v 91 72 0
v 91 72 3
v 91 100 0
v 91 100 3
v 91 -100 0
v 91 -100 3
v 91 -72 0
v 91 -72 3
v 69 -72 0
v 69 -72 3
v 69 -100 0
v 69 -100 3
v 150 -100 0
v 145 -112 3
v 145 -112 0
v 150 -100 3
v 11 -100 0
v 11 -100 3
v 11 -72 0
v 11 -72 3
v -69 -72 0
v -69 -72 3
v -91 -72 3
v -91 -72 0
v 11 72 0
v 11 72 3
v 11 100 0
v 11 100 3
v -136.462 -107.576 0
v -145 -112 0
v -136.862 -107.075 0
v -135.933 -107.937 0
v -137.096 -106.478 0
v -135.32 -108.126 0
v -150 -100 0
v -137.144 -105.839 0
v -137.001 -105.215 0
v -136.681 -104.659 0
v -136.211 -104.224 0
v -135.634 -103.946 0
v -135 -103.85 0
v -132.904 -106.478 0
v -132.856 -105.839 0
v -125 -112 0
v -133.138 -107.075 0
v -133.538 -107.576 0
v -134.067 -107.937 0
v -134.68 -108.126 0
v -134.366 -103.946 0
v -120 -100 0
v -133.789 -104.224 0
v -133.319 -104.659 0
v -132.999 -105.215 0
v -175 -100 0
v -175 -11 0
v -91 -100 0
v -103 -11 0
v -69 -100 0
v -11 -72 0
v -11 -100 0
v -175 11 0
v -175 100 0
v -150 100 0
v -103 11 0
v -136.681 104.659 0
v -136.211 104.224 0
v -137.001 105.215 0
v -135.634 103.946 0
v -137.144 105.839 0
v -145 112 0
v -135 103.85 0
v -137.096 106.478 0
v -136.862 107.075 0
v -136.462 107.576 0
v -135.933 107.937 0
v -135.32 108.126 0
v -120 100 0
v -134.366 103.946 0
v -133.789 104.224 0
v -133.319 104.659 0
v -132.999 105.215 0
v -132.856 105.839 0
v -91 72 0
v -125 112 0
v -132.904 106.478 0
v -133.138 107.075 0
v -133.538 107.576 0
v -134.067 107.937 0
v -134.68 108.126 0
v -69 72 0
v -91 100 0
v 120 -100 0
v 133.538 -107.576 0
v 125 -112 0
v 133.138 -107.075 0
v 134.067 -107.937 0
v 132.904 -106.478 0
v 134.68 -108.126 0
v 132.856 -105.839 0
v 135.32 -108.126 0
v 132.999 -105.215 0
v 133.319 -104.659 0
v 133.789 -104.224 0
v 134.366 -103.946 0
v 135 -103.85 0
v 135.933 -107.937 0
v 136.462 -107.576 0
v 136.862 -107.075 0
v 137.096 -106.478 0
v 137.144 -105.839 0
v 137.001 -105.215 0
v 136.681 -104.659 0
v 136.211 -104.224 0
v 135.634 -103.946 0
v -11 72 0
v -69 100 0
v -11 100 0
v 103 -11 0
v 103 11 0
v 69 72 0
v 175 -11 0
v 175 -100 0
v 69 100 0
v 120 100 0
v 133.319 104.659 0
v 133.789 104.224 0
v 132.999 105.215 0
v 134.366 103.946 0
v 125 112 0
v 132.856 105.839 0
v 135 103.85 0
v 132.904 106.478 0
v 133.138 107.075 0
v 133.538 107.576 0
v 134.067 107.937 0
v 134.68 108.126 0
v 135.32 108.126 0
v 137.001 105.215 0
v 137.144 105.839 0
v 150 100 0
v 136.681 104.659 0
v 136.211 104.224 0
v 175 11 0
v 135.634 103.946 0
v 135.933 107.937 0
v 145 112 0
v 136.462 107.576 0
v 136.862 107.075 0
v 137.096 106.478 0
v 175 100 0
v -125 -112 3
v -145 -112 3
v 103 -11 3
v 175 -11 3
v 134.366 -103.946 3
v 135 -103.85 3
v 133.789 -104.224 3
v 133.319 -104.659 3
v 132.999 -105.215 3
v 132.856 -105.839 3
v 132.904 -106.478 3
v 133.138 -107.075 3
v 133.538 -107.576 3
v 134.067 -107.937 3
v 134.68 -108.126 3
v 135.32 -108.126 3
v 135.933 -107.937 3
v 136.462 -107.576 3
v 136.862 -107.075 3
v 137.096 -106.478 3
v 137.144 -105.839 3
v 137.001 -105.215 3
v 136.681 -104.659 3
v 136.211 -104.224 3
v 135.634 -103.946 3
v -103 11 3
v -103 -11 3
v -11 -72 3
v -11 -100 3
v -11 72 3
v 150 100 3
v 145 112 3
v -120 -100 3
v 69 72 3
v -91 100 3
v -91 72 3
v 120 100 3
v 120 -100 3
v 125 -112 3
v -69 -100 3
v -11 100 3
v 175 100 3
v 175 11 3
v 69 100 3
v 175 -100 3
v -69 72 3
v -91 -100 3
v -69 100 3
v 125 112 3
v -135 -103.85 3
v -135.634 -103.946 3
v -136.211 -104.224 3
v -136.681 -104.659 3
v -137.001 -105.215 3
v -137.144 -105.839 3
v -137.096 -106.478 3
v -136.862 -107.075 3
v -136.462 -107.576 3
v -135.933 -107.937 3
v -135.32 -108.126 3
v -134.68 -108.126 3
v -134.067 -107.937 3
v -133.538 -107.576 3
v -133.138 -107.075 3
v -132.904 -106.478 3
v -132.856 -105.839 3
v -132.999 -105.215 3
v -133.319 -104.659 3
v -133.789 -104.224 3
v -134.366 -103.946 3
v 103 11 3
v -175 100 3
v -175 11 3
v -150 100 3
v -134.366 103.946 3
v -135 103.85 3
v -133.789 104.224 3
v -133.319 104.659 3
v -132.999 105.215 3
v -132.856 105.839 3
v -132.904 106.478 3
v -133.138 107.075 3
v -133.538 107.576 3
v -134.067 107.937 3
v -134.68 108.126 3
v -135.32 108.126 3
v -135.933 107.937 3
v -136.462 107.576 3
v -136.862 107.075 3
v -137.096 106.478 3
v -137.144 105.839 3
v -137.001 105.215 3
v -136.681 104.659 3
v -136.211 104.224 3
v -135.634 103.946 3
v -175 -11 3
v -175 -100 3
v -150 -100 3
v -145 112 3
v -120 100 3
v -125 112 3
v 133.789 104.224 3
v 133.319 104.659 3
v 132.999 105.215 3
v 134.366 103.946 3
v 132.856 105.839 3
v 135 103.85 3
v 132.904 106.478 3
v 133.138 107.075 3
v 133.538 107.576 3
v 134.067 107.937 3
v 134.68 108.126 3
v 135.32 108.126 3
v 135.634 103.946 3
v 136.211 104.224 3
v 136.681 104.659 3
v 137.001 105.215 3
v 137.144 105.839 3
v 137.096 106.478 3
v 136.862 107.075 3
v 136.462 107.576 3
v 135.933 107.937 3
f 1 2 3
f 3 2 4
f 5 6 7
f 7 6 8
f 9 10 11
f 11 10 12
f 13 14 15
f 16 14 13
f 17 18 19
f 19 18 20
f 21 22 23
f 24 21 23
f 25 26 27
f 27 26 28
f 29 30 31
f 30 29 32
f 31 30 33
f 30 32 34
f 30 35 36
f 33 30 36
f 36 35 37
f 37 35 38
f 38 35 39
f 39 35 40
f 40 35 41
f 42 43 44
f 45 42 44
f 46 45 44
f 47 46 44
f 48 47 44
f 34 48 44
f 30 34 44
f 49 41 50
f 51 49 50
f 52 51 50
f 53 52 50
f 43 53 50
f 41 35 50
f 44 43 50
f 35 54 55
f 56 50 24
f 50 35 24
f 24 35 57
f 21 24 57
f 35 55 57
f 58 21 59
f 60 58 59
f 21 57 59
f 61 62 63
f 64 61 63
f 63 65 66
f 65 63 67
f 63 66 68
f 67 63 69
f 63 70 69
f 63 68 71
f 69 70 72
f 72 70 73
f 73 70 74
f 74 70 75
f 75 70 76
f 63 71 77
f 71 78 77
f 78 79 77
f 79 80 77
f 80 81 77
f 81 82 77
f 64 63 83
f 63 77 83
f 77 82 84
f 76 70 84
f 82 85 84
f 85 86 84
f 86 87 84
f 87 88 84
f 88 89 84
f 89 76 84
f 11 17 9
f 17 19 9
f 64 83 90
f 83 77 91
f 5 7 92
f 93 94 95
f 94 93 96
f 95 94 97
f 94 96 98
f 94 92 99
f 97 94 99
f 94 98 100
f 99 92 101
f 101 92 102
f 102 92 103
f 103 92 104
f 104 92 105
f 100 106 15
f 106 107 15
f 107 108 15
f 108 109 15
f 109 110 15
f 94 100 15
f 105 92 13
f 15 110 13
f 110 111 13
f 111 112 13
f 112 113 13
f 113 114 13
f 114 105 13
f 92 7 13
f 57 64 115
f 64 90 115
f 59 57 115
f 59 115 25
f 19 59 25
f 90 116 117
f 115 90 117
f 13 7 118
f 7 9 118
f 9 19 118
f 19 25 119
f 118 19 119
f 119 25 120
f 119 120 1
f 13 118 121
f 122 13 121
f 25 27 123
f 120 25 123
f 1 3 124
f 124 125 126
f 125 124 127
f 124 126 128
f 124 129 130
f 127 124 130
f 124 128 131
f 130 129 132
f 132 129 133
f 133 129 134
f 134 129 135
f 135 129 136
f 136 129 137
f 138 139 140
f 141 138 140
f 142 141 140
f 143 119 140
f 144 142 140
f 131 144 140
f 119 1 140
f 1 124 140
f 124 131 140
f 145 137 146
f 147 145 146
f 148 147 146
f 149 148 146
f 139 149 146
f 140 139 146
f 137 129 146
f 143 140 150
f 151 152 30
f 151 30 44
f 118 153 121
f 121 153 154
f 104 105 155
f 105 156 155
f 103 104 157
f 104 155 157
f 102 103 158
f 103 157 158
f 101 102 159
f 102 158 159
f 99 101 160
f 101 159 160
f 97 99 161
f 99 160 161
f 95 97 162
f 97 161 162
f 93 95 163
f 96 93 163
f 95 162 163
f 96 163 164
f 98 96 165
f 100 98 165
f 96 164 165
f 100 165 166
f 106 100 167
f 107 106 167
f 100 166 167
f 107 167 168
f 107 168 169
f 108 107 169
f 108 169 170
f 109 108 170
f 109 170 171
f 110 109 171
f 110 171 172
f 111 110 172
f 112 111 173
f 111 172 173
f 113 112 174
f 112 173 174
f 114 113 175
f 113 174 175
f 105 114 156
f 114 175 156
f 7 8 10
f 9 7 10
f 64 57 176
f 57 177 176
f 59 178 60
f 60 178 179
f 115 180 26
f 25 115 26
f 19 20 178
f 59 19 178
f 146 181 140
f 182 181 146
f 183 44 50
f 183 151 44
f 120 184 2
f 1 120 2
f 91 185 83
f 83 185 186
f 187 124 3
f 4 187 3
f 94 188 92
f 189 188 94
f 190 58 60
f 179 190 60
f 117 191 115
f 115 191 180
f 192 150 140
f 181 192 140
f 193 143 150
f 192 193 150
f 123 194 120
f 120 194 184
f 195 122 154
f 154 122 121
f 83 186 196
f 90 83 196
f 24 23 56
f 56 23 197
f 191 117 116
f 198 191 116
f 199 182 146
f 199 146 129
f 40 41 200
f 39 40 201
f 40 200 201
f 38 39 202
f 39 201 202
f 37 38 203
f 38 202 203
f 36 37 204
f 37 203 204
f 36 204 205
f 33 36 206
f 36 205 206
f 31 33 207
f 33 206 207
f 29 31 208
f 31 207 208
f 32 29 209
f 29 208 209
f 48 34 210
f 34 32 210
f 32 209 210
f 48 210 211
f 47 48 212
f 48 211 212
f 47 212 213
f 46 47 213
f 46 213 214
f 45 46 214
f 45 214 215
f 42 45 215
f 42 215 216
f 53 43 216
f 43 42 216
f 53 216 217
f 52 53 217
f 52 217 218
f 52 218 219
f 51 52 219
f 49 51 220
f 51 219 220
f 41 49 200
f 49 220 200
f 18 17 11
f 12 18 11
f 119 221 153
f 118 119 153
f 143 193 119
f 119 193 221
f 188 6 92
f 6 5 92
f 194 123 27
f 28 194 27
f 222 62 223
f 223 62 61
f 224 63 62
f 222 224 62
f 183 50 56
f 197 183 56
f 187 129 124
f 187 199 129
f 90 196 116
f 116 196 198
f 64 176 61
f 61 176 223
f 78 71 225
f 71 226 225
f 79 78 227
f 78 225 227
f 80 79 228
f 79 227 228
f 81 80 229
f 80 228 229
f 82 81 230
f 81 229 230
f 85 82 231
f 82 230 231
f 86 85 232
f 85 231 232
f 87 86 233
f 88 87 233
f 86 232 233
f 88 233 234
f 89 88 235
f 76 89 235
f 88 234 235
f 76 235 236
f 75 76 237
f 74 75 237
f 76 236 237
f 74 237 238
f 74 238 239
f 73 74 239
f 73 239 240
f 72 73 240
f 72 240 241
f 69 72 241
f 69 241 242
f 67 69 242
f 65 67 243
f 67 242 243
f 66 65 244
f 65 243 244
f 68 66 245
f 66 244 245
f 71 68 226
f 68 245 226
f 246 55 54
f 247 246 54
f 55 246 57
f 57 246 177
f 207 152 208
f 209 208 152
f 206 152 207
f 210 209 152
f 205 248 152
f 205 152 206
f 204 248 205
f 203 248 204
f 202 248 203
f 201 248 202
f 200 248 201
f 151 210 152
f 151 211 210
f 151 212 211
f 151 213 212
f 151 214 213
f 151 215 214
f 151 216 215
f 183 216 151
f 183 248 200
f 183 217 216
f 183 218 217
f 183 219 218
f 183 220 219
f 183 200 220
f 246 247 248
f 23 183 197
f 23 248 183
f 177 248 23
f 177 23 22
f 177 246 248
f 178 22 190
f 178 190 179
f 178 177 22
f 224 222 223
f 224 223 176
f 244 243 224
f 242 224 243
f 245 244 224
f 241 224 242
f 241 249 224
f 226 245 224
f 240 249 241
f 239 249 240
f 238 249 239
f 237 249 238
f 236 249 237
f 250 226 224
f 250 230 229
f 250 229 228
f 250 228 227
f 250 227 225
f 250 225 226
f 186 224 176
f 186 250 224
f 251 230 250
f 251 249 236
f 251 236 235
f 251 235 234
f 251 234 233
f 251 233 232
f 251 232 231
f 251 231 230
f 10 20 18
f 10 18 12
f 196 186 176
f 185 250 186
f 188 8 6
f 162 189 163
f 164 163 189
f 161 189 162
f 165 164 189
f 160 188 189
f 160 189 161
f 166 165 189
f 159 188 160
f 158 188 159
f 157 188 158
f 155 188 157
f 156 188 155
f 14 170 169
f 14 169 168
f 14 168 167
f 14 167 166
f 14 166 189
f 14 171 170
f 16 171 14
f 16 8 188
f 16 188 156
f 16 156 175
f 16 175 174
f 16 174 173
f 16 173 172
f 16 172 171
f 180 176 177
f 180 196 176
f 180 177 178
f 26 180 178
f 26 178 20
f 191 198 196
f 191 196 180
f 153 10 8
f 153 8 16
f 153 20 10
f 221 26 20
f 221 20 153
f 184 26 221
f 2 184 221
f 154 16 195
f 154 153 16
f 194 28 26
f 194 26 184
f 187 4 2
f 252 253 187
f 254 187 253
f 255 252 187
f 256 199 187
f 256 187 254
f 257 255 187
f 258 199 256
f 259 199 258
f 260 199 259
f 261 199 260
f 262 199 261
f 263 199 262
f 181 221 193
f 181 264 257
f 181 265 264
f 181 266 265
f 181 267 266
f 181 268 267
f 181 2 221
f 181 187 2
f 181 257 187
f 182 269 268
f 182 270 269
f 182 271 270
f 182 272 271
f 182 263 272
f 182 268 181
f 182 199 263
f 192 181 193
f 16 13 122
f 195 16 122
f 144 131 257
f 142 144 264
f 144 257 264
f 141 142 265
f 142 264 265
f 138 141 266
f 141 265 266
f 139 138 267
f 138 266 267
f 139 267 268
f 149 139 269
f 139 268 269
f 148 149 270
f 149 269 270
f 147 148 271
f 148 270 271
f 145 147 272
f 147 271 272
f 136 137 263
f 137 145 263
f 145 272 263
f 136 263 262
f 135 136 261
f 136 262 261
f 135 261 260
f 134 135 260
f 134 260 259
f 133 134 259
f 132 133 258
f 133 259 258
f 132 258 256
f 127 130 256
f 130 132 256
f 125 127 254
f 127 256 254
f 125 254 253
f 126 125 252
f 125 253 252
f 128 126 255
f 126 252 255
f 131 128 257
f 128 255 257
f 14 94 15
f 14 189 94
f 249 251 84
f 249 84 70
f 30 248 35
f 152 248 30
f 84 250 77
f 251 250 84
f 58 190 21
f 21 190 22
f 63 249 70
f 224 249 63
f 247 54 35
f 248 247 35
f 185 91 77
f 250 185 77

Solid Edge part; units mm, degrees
sketch "Sketch1" plane through (0, 0, 0) normal (0, 0, 1) x (1, 0, 0)
  line L0 (-175, -100) -> (175, -100)
  line L1 (175, -100) -> (175, 100)
  line L2 (175, 100) -> (-175, 100)
  line L3 (-175, 100) -> (-175, -100)
  dimension "D1" = 200
  dimension "D2" = 350
extrude "Protrusion1" add sketch "Sketch1" along normal blind 3
sketch "Sketch2" plane through (0, 0, 3) normal (0, 0, 1) x (1, 0, 0)
  line L0 (-69, 100) -> (-91, 100)
  line L1 (-91, 100) -> (-91, 72)
  line L2 (-91, 72) -> (-69, 72)
  line L3 (-69, 72) -> (-69, 100)
  line L4 (-11, 72) -> (11, 72)
  line L5 (11, 72) -> (11, 100)
  line L6 (11, 100) -> (-11, 100)
  line L7 (-11, 100) -> (-11, 72)
  line L8 (-175, -11) -> (-103, -11)
  line L9 (-103, -11) -> (-103, 11)
  line L10 (-103, 11) -> (-175, 11)
  line L11 (-175, 11) -> (-175, -11)
  dimension "D1" = 22
  dimension "D2" = 28
  dimension "D3" = 58
  dimension "D4" = 22
  dimension "D5" = 22
  dimension "D6" = 72
extrude "Cutout1" cut sketch "Sketch2" against normal up to next
sketch "Sketch3" plane through (0, 0, 3) normal (0, 0, 1) x (1, 0, 0)
  line L0 (-150, 100) -> (-120, 100)
  line L1 (-120, 100) -> (-125, 112)
  line L2 (-125, 112) -> (-145, 112)
  line L3 (-145, 112) -> (-150, 100)
  dimension "D1" = 12
  dimension "D2" = 30
  dimension "D3" = 20
  dimension "D4" = 120
extrude "Protrusion2" add sketch "Sketch3" against normal up to vertex (3 mm away)
hole "Hole_1" at (-135, 106, 3) direction (0, 0, -1) diameter 4.3 end up to next
mirror "Mirror1" about plane through (0, 0, 0) normal (0, -1, 0) of "Cutout1", "Protrusion2", "Hole_1"
mirror "Mirror2" about plane through (0, 0, 0) normal (1, 0, 0) of "Cutout1", "Protrusion2", "Hole_1", "Mirror1"
properties material "Glass, general industrial"
